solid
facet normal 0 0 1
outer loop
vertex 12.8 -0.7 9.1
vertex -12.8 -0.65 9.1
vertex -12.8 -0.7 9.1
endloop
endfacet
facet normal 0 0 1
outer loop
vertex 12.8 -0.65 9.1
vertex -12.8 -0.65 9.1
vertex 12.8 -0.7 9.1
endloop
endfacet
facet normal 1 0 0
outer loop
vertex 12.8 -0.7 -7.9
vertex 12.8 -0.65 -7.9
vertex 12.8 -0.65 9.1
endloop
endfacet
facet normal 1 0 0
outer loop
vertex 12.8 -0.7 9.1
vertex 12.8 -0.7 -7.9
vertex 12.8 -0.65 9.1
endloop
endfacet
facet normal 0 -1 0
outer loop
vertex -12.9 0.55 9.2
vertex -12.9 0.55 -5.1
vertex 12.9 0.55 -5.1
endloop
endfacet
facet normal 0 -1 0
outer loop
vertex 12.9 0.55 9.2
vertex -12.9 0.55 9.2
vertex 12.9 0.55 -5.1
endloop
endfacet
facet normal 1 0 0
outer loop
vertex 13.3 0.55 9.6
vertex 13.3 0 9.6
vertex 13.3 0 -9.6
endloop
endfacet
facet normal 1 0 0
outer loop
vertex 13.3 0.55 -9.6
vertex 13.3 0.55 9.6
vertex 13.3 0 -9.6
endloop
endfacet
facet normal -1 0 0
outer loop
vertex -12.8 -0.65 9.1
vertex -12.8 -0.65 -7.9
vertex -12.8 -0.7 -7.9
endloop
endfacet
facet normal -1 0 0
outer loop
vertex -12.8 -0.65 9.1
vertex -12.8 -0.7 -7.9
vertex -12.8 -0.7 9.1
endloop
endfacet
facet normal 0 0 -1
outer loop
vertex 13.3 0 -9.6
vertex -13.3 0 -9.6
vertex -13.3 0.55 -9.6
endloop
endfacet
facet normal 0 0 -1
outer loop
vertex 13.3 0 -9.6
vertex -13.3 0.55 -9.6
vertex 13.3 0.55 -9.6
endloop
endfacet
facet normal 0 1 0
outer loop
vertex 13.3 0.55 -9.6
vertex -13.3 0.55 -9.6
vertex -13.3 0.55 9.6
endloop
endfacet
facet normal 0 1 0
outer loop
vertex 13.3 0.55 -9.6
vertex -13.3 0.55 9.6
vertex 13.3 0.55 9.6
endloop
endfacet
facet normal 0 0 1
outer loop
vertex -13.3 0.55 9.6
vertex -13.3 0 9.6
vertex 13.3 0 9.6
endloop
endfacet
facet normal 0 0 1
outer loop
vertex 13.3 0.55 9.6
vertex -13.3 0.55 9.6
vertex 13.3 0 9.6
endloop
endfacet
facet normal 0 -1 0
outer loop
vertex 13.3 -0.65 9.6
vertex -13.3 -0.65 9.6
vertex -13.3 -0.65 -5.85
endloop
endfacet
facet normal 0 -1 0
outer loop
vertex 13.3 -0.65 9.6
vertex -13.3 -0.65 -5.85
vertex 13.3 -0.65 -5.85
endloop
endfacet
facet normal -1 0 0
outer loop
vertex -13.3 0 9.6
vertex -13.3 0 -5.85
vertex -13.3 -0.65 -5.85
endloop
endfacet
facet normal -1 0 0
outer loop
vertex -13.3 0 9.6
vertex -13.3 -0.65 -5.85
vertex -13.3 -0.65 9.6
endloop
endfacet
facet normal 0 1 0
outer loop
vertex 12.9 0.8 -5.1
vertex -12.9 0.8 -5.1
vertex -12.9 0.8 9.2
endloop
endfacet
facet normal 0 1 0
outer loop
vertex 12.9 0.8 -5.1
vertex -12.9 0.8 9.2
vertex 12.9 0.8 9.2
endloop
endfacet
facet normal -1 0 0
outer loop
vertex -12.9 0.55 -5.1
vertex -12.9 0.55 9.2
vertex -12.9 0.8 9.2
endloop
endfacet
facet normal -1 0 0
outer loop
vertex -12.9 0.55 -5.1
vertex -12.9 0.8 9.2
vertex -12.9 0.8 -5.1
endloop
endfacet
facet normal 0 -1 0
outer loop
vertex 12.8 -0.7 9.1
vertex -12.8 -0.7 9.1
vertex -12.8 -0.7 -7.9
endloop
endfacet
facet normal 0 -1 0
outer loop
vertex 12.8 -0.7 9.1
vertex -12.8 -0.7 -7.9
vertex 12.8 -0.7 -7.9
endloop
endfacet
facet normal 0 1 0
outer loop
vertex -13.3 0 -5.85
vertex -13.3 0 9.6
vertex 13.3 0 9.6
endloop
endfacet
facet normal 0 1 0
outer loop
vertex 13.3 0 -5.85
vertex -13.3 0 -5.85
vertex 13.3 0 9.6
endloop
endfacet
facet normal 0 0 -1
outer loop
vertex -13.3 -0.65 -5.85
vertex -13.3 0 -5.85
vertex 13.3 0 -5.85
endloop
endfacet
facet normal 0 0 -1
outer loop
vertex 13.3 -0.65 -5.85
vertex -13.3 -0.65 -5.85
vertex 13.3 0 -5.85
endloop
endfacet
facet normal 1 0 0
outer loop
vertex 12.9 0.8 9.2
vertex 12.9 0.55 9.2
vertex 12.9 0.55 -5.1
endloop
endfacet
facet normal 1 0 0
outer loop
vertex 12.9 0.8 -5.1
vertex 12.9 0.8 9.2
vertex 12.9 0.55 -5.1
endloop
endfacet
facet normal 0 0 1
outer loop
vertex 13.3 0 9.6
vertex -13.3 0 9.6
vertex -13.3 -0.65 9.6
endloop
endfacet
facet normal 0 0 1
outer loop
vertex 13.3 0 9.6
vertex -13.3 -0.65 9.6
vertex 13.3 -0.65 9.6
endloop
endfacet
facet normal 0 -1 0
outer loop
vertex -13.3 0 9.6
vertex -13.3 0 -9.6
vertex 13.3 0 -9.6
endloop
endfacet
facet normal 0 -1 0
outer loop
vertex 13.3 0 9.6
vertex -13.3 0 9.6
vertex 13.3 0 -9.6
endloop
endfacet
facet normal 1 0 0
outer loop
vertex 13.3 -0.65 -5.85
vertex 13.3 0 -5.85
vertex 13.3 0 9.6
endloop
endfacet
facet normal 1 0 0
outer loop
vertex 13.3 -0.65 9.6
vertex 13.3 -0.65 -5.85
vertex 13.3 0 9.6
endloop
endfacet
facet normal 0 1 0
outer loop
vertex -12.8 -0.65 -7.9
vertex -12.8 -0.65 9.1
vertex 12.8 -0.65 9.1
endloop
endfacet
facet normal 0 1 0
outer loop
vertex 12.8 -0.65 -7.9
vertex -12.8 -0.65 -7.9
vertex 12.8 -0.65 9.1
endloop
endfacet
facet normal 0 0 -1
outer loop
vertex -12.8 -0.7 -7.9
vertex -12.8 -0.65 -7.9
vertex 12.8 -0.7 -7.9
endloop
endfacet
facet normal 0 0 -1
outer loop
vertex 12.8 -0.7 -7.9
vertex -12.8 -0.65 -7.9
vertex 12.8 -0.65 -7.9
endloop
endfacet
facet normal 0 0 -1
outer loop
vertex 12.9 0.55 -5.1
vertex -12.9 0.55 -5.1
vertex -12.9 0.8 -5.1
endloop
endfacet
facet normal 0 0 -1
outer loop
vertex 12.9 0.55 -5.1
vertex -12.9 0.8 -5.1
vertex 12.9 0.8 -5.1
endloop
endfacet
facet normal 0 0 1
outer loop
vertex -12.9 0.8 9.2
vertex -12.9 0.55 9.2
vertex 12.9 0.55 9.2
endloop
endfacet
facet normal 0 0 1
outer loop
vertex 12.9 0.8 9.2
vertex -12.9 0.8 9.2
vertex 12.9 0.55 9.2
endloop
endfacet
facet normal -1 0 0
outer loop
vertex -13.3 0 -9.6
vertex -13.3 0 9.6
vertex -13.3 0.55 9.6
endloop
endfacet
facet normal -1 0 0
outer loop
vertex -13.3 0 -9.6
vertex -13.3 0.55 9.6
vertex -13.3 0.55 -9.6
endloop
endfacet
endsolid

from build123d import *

# Parameters (mm, degrees)
SKETCH1_W           = 26.6
SKETCH1_H           = 19.2
BOSS_EXTRUDE1_DEPTH = 0.55
SKETCH3_W           = 26.6
SKETCH3_H           = 15.45
BOSS_EXTRUDE2_DEPTH = 0.65
SKETCH4_W           = 25.6
SKETCH4_H           = 17
BOSS_EXTRUDE3_DEPTH = 0.05
SKETCH2_W           = 25.8
SKETCH2_H           = 14.3
BOSS_EXTRUDE4_DEPTH = 0.25


with BuildPart() as part:
    # Sketch1 → Boss-Extrude1 (new body)
    with BuildSketch(Plane(origin=(0, 0, 0), x_dir=(1, 0, 0), z_dir=(0, 1, 0))):
        Rectangle(SKETCH1_W, SKETCH1_H)
    extrude(amount=BOSS_EXTRUDE1_DEPTH)


with BuildPart() as body_2:
    # Sketch3 → Boss-Extrude2 (new body)
    with BuildSketch(Plane.XZ):
        with Locations((0, 1.875)):
            Rectangle(SKETCH3_W, SKETCH3_H)
    extrude(amount=BOSS_EXTRUDE2_DEPTH)


with BuildPart() as body_3:
    # Sketch4 → Boss-Extrude3 (new body)
    with BuildSketch(Plane.XZ.offset(0.65)):
        with Locations((0, 0.6)):
            Rectangle(SKETCH4_W, SKETCH4_H)
    extrude(amount=BOSS_EXTRUDE3_DEPTH)


with BuildPart() as body_4:
    # Sketch2 → Boss-Extrude4 (new body)
    with BuildSketch(Plane(origin=(0, 0.55, 0), x_dir=(1, 0, 0), z_dir=(0, 1, 0))):
        with Locations((0, -2.05)):
            Rectangle(SKETCH2_W, SKETCH2_H)
    extrude(amount=BOSS_EXTRUDE4_DEPTH)


solid = Compound([part.part, body_2.part, body_3.part, body_4.part])
